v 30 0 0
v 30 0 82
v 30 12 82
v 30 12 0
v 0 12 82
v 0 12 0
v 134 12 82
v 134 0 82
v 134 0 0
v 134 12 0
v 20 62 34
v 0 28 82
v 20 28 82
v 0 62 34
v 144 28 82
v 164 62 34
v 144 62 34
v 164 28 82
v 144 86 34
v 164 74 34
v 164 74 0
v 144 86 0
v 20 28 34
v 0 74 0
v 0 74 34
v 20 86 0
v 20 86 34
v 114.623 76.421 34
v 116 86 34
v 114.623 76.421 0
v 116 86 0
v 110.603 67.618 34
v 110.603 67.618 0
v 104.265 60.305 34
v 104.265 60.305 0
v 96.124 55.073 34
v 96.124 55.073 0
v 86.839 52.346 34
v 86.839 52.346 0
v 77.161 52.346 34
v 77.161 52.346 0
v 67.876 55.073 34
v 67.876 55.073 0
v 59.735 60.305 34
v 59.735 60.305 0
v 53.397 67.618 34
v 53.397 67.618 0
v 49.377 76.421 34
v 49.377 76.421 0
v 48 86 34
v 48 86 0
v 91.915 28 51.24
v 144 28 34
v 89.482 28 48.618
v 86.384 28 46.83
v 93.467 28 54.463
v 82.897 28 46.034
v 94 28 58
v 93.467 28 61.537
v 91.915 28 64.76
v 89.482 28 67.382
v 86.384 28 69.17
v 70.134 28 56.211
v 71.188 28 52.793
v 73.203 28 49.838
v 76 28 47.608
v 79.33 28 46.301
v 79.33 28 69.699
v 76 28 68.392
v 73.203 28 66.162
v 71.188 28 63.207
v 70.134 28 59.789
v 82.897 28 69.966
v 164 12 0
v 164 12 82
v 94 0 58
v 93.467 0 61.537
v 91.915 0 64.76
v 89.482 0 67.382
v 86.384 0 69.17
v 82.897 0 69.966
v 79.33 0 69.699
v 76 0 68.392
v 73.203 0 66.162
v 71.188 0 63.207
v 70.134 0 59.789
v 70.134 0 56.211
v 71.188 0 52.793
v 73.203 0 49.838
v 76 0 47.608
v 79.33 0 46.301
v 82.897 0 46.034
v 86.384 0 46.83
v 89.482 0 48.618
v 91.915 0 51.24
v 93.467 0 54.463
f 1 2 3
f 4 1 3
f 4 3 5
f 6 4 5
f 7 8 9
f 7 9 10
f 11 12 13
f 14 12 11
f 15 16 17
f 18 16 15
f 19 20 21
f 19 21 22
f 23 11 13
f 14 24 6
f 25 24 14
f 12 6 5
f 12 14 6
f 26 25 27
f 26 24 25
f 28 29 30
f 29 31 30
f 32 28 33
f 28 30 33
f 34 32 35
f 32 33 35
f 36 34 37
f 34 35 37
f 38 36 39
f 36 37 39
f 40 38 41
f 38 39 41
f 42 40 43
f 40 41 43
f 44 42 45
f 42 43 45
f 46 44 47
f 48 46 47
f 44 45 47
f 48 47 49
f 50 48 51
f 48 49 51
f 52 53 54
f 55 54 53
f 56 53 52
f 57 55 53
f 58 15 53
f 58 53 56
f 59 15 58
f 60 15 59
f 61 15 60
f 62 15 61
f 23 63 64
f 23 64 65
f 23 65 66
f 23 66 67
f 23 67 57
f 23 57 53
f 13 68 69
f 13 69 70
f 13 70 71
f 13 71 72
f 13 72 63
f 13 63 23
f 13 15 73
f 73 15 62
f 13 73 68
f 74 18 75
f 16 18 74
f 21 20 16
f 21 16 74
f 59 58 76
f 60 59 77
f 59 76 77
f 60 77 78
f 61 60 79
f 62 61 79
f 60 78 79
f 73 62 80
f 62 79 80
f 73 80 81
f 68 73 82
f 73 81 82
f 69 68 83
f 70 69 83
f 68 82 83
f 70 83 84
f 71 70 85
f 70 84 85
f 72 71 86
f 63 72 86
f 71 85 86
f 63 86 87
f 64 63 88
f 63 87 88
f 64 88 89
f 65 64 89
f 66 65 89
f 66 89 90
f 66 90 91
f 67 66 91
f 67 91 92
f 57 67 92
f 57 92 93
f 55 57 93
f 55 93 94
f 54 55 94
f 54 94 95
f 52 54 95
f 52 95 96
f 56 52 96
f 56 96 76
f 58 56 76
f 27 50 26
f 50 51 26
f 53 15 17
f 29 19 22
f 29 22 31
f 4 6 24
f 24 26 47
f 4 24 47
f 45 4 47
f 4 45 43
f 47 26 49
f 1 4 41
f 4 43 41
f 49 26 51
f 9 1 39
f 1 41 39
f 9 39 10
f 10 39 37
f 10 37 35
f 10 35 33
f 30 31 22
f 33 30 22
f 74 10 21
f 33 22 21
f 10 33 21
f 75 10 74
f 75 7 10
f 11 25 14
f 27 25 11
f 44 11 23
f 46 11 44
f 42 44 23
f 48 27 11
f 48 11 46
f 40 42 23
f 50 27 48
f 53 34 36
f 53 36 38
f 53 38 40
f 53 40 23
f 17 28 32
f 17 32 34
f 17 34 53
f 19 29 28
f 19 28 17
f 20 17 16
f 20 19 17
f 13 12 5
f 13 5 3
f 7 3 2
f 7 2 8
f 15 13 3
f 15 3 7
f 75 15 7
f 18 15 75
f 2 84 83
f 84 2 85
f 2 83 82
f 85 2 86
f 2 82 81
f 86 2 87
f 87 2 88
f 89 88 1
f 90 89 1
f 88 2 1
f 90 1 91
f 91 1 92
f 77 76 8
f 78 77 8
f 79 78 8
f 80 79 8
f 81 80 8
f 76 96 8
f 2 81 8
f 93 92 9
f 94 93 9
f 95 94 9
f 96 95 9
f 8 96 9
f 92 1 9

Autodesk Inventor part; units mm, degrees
ref_plane "YZ Plane" through (0, 0, 0) normal (1, 0, 0) x (0, 1, 0)
ref_plane "XZ Plane" through (0, 0, 0) normal (0, 1, 0) x (-1, 0, 0)
ref_plane "XY Plane" through (0, 0, 0) normal (0, 0, 1) x (1, 0, 0)
sketch "Boceto1" plane through (0, 0, 0) normal (0, 0, 1) x (1, 0, 0)
  line L0 (0, 0) -> (164, 0)
  line L1 (164, 0) -> (164, 86)
  line L2 (164, 86) -> (0, 86)
  line L3 (0, 86) -> (0, 0)
  dimension "d0" = 164
  dimension "d1" = 86
extrude "Base" add sketch "Boceto1" along normal blind 82
sketch "Boceto2" plane through (0, 0, 82) normal (0, 0, 1) x (1, 0, 0)
  line L0 (0, 0) -> (164, 0) projected
  line L1 (164, 0) -> (134, 0)
  line L2 (134, 0) -> (134, 12)
  line L3 (134, 12) -> (164, 12)
  line L4 (164, 12) -> (164, 0)
  dimension "d4" = 30
  dimension "d5" = 12
extrude "Orificio_Inferior_Derecho" cut sketch "Boceto2" against normal blind 82
sketch "Boceto3" plane through (0, 0, 82) normal (0, 0, 1) x (1, 0, 0)
  line L0 (0, 86) -> (0, 0) projected
  line L1 (0, 0) -> (30, 0)
  line L2 (30, 0) -> (30, 12)
  line L3 (30, 12) -> (0, 12)
  line L4 (0, 12) -> (0, 0)
  dimension "d8" = 30
  dimension "d9" = 12
extrude "Orificio_Inferior_Izquierdo" cut sketch "Boceto3" against normal blind 82
sketch "Boceto5" plane through (0, 0, 0) normal (0, 0, -1) x (-1, 0, 0)
  line L0 (-164, 86) -> (0, 86) projected
  arc A0 (-116, 86) -> (-48, 86) centre (-82, 86) ccw
  point P0 (0, 0)
  dimension "d15" = 68
extrude "Medio_Círculo" cut sketch "Boceto5" against normal blind 34
sketch "Boceto7" plane through (0, 0, 82) normal (0, 0, 1) x (1, 0, 0)
  line L0 (0, 118.5619) -> (0, 23.764) construction
  line L1 (164, 118.5619) -> (164, 23.764) construction
  line L2 (164, 12) -> (164, 86) projected
  line L3 (0, 86) -> (0, 12) projected
  line L4 (202.848, 28) -> (-57.2499, 28) construction
  line L5 (30, 0) -> (134, 0) projected
  line L6 (164, 86) -> (0, 86) projected
  line L7 (0, 86) -> (164, 86)
  line L8 (164, 86) -> (164, 28)
  line L9 (164, 28) -> (0, 28)
  line L10 (0, 28) -> (0, 86)
  point P0 (0, 0)
  dimension "d23" = 0
  dimension "d24" = 0
  dimension "d25" = 28
extrude "Hueco" cut sketch "Boceto7" against normal blind 48
sketch "Boceto8" plane through (134, 0, 0) normal (0, -1, 0) x (1, 0, 0)
  line L0 (-150.3038, 58) -> (47.6348, 58) construction
  line L1 (-52, -16.1765) -> (-52, 95.9123) construction
  line L2 (30, 82) -> (30, 0) projected
  line L3 (-104, 82) -> (0, 82) projected
  circle A0 centre (-52, 58) radius 12
  point P0 (-134, 0)
  dimension "d28" = 82
  dimension "d29" = 24
  dimension "d30" = 24
extrude "Círculo" cut sketch "Boceto8" against normal blind 28
sketch "Boceto9" plane through (164, 12, 0) normal (1, 0, 0) x (0, 0, -1)
  line L0 (-92.1417, 50) -> (23.5619, 50) construction
  line L1 (-34, 16) -> (-82, 16) projected
  line L2 (-34, 74) -> (-34, 16) projected
  line L3 (-34, 50) -> (-82, 16)
  line L4 (-34, 16) -> (-34, 50)
  line L5 (-34, 16) -> (-82, 16)
  point P0 (0, -12)
  dimension "d33" = 34
extrude "Triángulo_Derecho" add sketch "Boceto9" against normal blind 20
sketch "Boceto10" plane through (0, 12, 0) normal (-1, 0, 0) x (0, 0, 1)
  line L0 (-15.7199, 50) -> (95.5491, 50) construction
  line L1 (82, 16) -> (34, 16) projected
  line L2 (34, 16) -> (34, 50) projected
  line L3 (34, 50) -> (34, 16)
  line L4 (82, 16) -> (34, 16) projected
  line L5 (34, 16) -> (82, 16)
  line L6 (82, 16) -> (34, 50)
  point P0 (0, -12)
  dimension "d36" = 34
extrude "Triángulo_Izquierdo" add sketch "Boceto10" against normal blind 20
sketch "Boceto11" plane through (0, 0, 0) normal (0, 0, -1) x (-1, 0, 0)
  line L0 (-144, 115.7571) -> (-144, -22.8513) construction
  line L1 (-164, 12) -> (-164, 86) projected
  line L2 (-189.9872, 62) -> (67.4285, 62) construction
  line L3 (-30, 0) -> (-134, 0) projected
  line L4 (-116, 86) -> (-164, 86) projected
  line L5 (-189.9872, 86) -> (-164, 86) construction
  line L6 (-197.4576, 74) -> (12.6853, 74) construction
  line L7 (-144, 86) -> (-164, 86)
  line L8 (-164, 86) -> (-164, 62) projected
  line L9 (-164, 86) -> (-164, 74)
  line L10 (-164, 74) -> (-144, 86)
  point P0 (0, 0)
  dimension "d39" = 20
  dimension "d40" = 62
  dimension "d41" = 24
  dimension "d42" = 12
extrude "Recorte_Superior_Derecho" cut sketch "Boceto11" against normal blind 34
sketch "Boceto12" plane through (0, 0, 0) normal (0, 0, -1) x (-1, 0, 0)
  line L0 (-163.8025, 74) -> (21.144, 74) construction
  line L1 (-20, 114.5089) -> (-20, -16.4312) construction
  line L2 (-48, 86) -> (0, 86) projected
  line L3 (0, 86) -> (0, 12) projected
  line L4 (0, 86) -> (-20, 86)
  line L5 (0, 62) -> (0, 86) projected
  line L6 (0, 74) -> (0, 86)
  line L7 (0, 86) -> (0, 74)
  line L8 (0, 74) -> (-20, 86)
  point P0 (0, 0)
  dimension "d45" = 12
  dimension "d46" = 20
extrude "Recorte_Superior_Izquierdo" cut sketch "Boceto12" against normal blind 34
